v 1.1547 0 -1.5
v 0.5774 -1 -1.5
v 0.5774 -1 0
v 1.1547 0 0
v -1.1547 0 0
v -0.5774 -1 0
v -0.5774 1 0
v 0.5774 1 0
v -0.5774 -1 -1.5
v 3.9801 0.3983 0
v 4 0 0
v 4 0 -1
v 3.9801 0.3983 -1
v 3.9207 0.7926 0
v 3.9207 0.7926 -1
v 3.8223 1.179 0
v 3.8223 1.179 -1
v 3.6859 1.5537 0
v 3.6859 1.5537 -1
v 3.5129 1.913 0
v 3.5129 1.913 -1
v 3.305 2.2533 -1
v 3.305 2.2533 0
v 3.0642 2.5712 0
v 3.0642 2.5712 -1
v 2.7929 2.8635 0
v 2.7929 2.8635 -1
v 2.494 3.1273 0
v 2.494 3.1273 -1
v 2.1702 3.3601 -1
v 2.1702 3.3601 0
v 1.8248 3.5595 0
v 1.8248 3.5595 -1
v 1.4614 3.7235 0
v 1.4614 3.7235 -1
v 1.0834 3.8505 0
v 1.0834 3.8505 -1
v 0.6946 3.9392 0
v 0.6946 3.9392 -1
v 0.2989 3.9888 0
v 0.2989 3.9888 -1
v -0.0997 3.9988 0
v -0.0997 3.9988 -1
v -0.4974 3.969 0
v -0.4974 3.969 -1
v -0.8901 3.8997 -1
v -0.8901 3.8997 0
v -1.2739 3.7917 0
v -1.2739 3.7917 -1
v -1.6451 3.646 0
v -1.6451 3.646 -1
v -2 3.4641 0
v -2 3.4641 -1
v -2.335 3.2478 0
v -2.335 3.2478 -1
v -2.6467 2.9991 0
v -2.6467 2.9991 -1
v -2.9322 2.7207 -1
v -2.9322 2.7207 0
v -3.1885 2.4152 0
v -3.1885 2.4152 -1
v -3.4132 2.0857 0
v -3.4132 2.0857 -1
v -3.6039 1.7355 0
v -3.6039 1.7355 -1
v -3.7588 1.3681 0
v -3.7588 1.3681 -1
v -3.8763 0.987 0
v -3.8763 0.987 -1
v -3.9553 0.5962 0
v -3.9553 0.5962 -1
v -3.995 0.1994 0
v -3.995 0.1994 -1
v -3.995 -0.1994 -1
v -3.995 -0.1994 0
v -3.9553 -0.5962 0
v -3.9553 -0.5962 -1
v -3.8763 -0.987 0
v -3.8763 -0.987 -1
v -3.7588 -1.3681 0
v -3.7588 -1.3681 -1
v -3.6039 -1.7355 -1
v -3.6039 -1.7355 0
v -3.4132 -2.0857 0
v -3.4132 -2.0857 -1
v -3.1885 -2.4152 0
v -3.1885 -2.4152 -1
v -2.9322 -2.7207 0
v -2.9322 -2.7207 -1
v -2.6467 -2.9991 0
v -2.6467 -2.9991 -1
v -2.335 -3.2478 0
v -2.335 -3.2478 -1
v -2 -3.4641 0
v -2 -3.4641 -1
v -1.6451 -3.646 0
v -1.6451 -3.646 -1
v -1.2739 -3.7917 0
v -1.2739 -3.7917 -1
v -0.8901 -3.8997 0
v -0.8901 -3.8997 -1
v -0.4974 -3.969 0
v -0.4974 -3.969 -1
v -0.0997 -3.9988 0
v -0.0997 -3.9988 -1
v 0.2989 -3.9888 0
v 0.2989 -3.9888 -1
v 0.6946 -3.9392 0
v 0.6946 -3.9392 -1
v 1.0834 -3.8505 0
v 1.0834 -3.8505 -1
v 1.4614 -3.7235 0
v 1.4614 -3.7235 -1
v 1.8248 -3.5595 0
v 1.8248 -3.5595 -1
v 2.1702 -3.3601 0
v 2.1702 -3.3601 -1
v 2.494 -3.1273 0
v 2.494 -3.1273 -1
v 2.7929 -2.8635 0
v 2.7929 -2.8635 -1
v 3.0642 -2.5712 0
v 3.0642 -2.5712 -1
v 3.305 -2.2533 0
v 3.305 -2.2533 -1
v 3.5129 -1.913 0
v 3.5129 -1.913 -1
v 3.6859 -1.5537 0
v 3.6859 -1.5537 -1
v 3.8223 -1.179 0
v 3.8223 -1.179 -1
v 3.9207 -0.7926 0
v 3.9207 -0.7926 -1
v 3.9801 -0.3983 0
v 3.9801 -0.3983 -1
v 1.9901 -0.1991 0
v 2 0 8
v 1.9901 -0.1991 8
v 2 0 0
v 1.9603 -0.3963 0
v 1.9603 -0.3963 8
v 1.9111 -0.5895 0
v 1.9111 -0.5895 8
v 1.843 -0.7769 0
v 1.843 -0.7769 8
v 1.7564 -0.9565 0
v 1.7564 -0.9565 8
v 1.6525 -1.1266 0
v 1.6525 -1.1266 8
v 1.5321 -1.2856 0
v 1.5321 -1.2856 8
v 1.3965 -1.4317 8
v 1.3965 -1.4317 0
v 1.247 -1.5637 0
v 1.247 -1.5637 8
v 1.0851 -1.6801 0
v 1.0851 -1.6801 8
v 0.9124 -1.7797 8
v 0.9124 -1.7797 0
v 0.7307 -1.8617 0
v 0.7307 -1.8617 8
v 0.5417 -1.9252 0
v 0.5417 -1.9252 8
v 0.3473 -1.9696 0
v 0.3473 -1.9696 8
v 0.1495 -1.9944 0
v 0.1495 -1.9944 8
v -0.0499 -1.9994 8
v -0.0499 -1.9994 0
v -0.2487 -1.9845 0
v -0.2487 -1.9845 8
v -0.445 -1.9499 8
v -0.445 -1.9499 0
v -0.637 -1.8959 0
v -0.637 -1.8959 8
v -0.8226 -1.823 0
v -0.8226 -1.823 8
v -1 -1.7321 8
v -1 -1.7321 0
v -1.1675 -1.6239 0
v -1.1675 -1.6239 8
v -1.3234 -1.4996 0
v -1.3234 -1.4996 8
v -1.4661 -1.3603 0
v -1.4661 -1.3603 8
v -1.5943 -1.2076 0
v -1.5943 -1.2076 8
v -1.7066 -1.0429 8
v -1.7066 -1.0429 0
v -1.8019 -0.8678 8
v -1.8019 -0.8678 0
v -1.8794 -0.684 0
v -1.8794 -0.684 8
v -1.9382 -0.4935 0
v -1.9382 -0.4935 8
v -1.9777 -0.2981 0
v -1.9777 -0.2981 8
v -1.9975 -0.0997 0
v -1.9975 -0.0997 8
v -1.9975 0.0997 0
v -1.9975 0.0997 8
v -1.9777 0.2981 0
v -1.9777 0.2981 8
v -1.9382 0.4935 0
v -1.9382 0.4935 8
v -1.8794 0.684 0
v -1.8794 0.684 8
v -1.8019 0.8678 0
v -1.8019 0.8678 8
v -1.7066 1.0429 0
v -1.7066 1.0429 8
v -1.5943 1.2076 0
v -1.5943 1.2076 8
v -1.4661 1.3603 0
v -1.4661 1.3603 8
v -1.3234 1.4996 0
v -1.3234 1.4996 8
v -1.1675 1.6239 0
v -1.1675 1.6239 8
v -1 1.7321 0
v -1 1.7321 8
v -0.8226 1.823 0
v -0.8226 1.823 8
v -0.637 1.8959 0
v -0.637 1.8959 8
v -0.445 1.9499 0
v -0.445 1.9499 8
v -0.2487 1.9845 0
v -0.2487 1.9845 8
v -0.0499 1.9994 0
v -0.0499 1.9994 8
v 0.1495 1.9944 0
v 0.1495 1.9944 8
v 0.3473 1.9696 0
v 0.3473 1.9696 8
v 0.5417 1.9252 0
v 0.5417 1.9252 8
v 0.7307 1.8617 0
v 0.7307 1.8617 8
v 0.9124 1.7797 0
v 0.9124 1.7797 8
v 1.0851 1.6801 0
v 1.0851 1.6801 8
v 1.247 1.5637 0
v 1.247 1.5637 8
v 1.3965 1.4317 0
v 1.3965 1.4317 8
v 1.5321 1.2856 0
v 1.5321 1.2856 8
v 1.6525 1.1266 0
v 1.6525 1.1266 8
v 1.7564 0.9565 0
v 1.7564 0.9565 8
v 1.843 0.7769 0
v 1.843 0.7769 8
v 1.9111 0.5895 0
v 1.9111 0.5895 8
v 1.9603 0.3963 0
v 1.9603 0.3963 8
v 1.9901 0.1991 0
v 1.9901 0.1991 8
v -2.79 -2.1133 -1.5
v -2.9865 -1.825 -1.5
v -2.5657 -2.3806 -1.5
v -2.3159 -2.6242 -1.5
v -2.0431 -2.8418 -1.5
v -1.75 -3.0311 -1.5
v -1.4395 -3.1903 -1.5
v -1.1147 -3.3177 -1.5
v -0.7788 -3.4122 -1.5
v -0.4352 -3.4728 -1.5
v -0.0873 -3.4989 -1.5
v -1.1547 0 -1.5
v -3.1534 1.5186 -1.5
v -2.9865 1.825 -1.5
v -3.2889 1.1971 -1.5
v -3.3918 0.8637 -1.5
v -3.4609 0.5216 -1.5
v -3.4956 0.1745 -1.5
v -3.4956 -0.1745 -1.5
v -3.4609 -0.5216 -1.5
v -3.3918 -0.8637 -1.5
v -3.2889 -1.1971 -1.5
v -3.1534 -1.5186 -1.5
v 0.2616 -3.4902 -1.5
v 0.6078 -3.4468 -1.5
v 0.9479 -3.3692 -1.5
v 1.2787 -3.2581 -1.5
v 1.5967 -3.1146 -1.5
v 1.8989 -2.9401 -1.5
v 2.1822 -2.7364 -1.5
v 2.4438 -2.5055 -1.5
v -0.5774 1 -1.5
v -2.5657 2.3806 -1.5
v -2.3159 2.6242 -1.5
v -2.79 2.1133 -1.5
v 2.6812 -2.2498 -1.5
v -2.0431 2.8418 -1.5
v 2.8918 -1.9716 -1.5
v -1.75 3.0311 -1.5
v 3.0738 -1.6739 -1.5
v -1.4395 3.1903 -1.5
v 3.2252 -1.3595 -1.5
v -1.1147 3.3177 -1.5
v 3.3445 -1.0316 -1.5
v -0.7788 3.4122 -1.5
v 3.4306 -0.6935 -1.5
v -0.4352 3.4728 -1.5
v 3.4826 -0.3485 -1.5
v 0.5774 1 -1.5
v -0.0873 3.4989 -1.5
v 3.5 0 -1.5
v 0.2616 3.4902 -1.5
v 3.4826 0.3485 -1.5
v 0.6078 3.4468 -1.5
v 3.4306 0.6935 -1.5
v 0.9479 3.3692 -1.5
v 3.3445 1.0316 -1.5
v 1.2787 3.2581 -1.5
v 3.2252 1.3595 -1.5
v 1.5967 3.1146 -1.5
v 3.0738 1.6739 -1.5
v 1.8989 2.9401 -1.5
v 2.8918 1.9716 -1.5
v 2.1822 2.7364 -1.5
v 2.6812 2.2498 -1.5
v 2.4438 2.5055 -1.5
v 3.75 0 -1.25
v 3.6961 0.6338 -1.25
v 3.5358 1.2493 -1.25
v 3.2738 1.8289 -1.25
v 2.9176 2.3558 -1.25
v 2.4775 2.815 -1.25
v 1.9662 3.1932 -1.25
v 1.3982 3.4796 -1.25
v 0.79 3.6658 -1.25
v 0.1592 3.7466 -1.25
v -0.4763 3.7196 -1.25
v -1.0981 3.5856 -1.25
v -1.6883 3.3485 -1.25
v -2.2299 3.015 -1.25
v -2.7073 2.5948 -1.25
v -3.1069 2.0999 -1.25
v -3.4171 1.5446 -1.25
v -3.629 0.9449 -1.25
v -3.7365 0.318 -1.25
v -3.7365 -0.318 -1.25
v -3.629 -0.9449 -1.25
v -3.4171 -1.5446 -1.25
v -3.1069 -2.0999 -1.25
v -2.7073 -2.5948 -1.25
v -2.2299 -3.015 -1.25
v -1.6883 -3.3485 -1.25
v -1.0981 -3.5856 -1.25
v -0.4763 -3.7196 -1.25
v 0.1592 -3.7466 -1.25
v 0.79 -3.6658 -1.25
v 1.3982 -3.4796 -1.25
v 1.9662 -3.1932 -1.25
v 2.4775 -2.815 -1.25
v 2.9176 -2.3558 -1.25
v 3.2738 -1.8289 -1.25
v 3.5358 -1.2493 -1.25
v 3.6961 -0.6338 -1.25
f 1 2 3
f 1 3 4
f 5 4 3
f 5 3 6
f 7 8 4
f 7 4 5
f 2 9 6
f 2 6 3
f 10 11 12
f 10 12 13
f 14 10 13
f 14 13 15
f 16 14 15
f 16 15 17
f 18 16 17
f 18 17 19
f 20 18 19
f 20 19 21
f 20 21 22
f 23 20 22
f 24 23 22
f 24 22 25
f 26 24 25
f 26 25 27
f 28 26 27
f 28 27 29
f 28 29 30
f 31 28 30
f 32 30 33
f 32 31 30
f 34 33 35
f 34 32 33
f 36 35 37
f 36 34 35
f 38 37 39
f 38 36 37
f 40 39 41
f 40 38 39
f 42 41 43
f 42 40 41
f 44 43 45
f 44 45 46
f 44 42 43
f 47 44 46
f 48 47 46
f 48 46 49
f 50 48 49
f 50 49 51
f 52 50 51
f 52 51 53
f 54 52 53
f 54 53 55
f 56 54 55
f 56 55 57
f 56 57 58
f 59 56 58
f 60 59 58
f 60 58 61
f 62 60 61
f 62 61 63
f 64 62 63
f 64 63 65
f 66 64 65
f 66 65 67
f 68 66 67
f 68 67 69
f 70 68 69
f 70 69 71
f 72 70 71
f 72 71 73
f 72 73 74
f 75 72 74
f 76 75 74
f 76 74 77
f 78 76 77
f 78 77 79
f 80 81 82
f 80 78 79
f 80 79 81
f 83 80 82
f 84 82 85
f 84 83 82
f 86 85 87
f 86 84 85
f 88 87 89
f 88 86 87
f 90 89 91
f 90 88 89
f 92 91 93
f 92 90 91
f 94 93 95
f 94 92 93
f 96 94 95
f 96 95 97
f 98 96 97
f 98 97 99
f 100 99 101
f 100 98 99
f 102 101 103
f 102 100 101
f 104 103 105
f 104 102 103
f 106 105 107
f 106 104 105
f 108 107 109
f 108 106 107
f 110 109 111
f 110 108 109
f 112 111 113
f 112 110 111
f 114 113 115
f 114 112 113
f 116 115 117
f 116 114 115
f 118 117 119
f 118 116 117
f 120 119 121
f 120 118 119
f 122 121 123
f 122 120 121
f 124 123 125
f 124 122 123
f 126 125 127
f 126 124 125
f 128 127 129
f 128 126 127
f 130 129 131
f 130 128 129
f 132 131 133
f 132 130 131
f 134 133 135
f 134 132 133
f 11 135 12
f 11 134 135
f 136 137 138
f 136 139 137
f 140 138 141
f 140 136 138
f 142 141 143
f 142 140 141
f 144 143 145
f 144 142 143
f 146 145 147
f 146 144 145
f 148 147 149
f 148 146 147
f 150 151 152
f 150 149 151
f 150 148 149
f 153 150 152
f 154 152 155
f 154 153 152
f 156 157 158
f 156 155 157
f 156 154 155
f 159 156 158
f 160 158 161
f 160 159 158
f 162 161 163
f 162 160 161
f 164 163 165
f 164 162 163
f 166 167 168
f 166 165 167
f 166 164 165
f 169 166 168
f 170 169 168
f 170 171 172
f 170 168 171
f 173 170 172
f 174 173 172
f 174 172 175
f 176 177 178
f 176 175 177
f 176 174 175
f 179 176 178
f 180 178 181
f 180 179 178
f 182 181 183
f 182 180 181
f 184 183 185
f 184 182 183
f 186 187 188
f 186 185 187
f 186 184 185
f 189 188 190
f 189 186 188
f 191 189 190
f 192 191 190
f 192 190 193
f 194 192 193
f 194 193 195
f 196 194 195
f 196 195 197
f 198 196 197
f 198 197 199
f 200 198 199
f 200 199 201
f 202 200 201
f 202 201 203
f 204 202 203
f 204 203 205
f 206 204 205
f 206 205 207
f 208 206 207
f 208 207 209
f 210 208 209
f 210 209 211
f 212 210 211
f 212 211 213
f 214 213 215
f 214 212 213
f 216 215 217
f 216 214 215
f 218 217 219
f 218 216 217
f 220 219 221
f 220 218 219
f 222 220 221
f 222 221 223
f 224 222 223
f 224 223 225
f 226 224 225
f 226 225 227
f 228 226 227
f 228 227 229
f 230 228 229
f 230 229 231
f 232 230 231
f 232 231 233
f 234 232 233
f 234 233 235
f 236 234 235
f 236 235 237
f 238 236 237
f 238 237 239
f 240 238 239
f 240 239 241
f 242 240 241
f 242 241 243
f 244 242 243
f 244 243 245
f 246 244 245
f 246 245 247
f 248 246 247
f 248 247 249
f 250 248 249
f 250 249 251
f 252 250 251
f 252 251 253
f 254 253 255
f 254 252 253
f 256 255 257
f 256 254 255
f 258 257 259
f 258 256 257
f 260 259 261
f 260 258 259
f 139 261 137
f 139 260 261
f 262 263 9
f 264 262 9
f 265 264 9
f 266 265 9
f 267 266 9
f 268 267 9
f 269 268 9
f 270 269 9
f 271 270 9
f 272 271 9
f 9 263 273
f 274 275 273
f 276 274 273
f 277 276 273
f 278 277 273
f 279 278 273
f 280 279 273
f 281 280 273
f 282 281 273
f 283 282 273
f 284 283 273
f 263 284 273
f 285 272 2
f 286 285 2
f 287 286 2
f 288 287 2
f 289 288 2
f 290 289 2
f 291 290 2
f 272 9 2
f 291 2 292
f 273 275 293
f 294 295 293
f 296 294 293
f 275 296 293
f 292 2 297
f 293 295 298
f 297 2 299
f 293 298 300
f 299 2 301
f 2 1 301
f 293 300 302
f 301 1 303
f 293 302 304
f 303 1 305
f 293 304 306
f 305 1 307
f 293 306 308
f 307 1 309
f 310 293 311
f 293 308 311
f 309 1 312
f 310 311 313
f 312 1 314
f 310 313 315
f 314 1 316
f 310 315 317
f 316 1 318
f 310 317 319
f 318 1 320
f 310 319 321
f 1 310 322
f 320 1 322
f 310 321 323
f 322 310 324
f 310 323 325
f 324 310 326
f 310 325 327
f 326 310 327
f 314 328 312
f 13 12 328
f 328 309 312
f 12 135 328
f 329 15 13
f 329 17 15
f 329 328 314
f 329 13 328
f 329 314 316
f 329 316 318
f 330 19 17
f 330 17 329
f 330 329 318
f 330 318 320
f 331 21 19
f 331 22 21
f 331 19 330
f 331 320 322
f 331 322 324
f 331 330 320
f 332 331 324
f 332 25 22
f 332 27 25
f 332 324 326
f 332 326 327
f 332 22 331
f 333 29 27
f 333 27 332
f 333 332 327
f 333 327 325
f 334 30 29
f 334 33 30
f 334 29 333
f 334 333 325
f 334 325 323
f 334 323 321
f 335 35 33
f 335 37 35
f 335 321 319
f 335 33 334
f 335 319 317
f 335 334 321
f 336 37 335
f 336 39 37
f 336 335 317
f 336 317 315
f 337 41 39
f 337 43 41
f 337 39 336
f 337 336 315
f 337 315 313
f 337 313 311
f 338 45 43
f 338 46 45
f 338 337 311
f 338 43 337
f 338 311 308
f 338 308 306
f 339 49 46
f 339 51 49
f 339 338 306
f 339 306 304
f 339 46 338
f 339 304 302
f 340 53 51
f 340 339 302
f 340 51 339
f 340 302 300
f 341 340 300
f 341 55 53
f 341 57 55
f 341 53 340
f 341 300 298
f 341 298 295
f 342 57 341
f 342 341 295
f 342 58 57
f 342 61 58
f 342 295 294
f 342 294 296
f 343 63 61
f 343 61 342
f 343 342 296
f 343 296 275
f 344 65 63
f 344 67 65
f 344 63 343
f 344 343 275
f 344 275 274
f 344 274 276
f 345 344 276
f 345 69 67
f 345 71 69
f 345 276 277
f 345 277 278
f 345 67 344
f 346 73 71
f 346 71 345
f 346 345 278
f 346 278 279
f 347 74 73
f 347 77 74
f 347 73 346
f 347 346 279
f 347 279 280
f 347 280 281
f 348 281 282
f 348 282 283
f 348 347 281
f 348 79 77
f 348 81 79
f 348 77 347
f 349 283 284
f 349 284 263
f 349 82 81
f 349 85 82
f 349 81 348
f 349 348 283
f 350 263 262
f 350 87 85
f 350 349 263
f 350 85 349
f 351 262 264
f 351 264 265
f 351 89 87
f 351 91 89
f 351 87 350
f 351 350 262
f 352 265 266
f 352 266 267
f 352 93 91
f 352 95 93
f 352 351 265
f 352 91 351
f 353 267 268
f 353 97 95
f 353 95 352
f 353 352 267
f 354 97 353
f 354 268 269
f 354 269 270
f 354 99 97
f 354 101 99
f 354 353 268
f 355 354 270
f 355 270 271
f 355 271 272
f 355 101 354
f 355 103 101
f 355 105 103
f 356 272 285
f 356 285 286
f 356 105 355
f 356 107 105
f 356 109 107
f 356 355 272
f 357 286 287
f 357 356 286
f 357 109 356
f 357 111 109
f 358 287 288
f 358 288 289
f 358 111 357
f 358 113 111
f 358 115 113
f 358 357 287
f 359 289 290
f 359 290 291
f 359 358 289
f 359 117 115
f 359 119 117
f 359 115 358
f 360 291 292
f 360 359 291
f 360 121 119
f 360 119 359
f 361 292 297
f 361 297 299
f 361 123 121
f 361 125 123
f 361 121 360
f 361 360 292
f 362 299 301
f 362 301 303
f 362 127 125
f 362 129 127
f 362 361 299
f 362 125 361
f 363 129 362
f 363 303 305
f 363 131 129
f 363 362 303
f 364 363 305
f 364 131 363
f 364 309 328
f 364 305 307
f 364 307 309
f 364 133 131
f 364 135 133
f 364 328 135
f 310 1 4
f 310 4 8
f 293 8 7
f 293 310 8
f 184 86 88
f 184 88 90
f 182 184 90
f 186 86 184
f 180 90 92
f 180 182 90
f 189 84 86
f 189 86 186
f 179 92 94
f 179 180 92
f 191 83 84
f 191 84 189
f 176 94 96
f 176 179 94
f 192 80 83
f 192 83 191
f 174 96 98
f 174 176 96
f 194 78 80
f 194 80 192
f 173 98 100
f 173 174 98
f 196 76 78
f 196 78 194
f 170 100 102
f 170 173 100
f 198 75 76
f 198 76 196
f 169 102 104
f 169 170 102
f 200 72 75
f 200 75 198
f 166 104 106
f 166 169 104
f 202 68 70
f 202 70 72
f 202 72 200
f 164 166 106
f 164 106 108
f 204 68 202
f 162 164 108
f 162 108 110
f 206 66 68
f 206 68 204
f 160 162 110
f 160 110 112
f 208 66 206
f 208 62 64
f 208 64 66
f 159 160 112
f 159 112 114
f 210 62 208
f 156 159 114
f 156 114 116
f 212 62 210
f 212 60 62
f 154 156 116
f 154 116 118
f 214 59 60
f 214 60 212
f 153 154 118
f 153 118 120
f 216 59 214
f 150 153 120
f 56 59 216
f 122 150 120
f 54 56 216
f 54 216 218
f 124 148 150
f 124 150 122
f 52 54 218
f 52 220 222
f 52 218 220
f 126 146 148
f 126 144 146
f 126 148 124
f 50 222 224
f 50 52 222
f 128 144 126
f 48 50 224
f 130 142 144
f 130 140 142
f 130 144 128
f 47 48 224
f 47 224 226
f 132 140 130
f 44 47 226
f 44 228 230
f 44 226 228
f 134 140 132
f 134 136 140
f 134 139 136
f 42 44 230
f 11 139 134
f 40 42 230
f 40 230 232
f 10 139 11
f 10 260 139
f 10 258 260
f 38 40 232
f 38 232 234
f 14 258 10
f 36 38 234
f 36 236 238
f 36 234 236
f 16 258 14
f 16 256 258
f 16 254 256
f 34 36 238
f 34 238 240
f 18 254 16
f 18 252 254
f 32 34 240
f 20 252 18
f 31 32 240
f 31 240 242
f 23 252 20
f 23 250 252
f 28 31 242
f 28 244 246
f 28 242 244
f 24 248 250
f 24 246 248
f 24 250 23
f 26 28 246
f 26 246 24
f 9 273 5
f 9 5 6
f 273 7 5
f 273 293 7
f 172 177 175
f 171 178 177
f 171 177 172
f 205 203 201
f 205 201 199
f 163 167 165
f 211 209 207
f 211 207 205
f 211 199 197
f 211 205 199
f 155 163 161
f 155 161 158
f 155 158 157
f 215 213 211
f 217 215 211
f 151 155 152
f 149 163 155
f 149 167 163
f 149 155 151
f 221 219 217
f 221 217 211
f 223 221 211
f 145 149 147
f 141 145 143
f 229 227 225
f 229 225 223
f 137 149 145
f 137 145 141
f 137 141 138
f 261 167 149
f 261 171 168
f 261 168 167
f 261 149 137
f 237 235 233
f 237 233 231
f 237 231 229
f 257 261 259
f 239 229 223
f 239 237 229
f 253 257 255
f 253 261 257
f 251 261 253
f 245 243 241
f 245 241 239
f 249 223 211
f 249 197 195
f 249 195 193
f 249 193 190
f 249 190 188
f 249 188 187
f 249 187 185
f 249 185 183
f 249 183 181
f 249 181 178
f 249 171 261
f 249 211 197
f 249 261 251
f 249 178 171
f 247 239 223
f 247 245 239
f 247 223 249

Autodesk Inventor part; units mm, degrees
ref_plane "YZ Plane" through (0, 0, 0) normal (1, 0, 0) x (0, 1, 0)
ref_plane "XZ Plane" through (0, 0, 0) normal (0, 1, 0) x (-1, 0, 0)
ref_plane "XY Plane" through (0, 0, 0) normal (0, 0, 1) x (1, 0, 0)
sketch "スケッチ1" plane through (0, 0, 0) normal (0, 0, 1) x (1, 0, 0)
  circle A0 centre (0, 0) radius 4
  circle A1 centre (0, 0) radius 2
  dimension "d0" = 8
  dimension "d1" = 4
extrude "押し出し1" add sketch "スケッチ1" against normal blind 1.5 contours A0 | A1
extrude "押し出し2" add sketch "スケッチ1" along normal blind 8 contours A1
sketch "スケッチ2" plane through (0, 0, -1.5) normal (0, 0, -1) x (-1, 0, 0)
  line L0 (-0.5774, 1) -> (0.5774, 1)
  line L1 (0.5774, 1) -> (1.1547, 0)
  line L2 (1.1547, 0) -> (0.5774, -1)
  line L3 (0.5774, -1) -> (-0.5774, -1)
  line L4 (-0.5774, -1) -> (-1.1547, 0)
  line L5 (-1.1547, 0) -> (-0.5774, 1)
  point P0 (0, 0)
  point P1 (0, 0)
  dimension "d6" = 2
extrude "押し出し3" cut sketch "スケッチ2" against normal blind 1.5
chamfer "面取り1" distance 0.5 angle 45 1 edges at (-4, 0, -1.5)
thread "ねじ1" size "M4x0.7" class "6g" standard "ANSI Metric M Profile" full length
properties part number "低頭ねじM4×8" material "鋼"
